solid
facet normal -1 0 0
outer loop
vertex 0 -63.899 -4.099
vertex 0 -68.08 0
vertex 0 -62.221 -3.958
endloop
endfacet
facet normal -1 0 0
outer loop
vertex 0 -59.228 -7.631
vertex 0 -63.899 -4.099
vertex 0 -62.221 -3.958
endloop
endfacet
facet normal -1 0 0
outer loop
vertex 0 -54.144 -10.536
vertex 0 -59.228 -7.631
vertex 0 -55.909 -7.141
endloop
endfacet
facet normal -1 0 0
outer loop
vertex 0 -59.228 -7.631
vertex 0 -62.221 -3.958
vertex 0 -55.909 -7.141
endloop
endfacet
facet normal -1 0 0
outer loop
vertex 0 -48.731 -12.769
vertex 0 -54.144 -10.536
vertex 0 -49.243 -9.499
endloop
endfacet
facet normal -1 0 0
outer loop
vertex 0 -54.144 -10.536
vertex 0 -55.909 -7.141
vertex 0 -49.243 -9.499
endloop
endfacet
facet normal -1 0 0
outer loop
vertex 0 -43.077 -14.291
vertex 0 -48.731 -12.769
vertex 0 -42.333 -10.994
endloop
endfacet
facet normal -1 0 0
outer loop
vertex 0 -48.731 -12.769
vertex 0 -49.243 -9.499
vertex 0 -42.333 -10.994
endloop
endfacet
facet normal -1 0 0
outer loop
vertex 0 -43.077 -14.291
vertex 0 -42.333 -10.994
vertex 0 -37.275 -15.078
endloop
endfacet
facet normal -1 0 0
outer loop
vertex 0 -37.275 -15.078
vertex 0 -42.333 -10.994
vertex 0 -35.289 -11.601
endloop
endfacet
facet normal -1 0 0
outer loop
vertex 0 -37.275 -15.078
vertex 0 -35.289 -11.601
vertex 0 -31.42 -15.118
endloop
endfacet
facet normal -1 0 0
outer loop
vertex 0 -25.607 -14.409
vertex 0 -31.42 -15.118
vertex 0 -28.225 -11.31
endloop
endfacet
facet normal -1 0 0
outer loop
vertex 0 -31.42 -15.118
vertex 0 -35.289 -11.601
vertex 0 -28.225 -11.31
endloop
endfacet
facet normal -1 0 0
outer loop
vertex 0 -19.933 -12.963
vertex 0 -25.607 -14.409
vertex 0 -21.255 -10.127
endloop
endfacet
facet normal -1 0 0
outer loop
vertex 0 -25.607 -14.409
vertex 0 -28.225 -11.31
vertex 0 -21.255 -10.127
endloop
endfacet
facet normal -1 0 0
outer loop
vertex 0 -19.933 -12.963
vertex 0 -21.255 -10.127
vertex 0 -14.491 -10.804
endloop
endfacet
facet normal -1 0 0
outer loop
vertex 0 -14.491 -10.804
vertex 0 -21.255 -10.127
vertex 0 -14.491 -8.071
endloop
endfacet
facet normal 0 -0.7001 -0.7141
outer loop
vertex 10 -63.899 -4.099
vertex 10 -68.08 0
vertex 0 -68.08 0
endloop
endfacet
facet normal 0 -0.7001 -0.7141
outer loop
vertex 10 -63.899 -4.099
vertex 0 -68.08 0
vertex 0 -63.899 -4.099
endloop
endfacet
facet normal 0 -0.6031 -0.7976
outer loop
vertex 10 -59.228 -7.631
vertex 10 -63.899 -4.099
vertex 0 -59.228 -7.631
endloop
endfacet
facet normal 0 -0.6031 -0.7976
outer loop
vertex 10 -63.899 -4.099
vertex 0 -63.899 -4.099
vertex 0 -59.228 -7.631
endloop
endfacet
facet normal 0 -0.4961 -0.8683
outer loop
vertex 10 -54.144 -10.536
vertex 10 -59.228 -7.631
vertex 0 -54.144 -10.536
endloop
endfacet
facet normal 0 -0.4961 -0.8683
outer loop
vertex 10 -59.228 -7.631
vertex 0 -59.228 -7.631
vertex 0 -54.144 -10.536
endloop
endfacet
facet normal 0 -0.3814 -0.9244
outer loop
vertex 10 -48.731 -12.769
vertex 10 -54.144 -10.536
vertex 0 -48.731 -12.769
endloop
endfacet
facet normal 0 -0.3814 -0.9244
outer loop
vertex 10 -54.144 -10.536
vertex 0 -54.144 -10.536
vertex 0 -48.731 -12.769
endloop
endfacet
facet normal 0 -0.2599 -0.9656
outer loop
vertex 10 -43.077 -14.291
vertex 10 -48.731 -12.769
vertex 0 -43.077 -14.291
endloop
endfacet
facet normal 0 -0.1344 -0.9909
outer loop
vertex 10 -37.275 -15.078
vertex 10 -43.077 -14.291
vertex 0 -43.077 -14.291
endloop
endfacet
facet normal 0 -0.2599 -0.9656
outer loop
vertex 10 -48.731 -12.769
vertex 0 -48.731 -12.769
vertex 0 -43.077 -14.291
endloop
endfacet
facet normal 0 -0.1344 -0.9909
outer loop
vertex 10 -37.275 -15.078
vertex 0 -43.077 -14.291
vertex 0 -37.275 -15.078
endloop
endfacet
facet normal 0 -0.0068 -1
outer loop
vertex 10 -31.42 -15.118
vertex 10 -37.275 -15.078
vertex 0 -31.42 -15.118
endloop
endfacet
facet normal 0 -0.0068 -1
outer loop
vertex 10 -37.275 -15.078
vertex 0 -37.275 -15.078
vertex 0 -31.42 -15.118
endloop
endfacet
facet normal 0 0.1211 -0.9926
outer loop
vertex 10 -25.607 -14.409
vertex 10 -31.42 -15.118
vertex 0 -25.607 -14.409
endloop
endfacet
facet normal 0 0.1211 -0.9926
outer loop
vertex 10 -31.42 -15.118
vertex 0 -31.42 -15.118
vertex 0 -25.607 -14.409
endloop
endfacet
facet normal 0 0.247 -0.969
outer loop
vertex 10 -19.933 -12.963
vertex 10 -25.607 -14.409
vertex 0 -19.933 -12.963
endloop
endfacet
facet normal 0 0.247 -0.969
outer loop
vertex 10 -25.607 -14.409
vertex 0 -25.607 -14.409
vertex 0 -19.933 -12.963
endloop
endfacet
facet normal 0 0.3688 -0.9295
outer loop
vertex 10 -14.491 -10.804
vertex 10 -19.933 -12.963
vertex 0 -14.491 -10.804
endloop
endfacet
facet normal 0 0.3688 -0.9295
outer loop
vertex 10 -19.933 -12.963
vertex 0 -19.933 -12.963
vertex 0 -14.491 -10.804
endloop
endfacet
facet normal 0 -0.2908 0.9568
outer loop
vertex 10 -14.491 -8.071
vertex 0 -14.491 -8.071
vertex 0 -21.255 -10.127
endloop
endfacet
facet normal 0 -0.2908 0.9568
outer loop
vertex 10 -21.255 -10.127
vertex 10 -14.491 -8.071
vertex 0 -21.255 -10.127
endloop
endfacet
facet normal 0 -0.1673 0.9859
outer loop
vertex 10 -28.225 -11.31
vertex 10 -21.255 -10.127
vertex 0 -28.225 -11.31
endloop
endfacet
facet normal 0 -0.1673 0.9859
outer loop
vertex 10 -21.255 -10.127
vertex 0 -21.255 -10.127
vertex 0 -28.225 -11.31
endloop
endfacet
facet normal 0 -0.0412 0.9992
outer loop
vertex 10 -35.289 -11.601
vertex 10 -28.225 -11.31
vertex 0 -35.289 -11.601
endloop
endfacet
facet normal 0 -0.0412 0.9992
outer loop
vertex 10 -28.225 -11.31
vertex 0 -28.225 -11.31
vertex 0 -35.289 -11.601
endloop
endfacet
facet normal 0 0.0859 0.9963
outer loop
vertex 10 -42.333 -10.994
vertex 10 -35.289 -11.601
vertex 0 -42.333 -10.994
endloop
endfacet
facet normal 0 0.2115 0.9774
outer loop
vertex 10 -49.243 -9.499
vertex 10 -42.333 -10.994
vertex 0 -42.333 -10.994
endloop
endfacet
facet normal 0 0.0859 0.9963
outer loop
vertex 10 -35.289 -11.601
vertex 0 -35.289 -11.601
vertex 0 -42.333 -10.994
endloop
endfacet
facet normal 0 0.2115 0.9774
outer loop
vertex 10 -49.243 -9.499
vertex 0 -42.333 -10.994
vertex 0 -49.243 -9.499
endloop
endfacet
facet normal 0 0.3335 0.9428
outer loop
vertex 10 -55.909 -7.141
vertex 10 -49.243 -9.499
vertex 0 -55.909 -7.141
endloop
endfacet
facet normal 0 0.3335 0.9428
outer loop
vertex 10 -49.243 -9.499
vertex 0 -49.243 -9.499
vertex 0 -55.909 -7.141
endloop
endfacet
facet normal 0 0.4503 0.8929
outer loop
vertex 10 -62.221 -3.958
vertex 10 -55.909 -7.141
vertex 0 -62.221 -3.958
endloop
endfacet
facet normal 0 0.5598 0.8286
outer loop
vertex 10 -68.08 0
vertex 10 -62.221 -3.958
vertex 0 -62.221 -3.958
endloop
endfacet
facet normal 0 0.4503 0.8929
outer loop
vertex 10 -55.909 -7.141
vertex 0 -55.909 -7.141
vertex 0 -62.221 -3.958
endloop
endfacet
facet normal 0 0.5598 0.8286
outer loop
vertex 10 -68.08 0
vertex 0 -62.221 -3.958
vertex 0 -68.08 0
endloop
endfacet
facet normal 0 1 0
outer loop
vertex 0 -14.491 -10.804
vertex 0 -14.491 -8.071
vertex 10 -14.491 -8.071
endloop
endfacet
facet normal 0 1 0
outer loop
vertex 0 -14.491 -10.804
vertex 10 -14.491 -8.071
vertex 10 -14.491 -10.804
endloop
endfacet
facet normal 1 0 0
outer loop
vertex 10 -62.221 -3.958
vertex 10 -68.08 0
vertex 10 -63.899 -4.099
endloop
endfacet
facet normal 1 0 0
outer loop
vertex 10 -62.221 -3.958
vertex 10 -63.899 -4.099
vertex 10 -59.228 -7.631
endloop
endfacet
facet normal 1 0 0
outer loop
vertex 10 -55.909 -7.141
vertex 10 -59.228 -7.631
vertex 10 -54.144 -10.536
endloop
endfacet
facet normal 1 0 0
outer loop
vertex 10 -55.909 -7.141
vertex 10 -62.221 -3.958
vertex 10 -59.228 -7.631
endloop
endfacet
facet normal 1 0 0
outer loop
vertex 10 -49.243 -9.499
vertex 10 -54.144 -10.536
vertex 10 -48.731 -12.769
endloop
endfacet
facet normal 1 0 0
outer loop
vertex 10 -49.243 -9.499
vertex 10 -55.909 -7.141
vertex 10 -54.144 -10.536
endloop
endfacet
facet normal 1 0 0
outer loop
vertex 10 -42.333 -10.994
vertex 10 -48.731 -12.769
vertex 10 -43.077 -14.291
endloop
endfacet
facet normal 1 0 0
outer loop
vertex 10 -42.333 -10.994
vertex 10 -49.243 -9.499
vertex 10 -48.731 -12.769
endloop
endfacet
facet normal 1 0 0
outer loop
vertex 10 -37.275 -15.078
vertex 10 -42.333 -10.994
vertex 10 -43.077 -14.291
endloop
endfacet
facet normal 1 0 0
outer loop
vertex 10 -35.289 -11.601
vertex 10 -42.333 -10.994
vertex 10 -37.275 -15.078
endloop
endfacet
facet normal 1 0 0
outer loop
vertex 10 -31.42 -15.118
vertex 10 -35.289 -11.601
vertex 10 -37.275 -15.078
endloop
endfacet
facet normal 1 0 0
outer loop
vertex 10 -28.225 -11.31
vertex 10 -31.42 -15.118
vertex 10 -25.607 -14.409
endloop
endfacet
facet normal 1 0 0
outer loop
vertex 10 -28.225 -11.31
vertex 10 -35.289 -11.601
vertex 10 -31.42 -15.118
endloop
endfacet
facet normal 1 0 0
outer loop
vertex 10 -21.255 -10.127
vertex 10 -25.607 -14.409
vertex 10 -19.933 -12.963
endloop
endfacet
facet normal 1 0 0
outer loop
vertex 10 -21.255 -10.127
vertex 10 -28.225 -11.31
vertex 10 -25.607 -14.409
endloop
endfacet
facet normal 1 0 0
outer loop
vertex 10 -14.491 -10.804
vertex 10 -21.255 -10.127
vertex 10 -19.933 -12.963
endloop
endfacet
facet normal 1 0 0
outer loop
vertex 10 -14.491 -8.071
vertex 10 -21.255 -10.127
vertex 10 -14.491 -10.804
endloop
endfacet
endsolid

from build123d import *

# Parameters (mm, degrees)
F1_DEPTH = 10
F3_DEPTH = 35
F5_DEPTH = 45.001


with BuildPart() as f1:
    # F0 (on Right) → F1 (new body)
    with BuildSketch(Plane.YZ):
        with BuildLine():
            ThreePointArc((0, 0), (-34.0398401022, -11.614694955), (-68.0796802044, 0))
            ThreePointArc((-68.0796802044, 0), (-43.0772294723, -14.2909034111), (-14.4906720078, -10.8036128804))
            ThreePointArc((-14.4906720078, -10.8036128804), (-6.7062533875, -6.1248672779), (0, 0))
        make_face()
        with BuildLine():
            ThreePointArc((0, 0), (-6.7062533875, -6.1248672779), (-14.4906720078, -10.8036128804))
            Line((-14.4906720078, -10.8036128804), (0, -10.8036128804))
            Line((0, -10.8036128804), (0, 0))
        make_face()
    extrude(amount=F1_DEPTH)

    # F2 (on face) → F3 (join)
    with BuildSketch(Plane(origin=(0, 0, 0), x_dir=(0, -1, 0), z_dir=(-1, 0, 0))):
        with BuildLine():
            Line((0, -10.8036128804), (14.4906720078, -10.8036128804))
            Line((14.4906720078, -10.8036128804), (14.4906720078, -8.0706065552))
            ThreePointArc((14.4906720078, -8.0706065552), (6.9431775325, -4.5778249918), (0, 0))
            Line((0, 0), (0, -10.8036128804))
        make_face()
    extrude(amount=F3_DEPTH)

    # F4 (on face) → F5 (cut, through all)
    with BuildSketch(Plane.YZ.offset(10)):
        with BuildLine():
            Line((-14.4906720078, -8.0706065552), (-14.4906720078, -10.8036128804))
            Line((-14.4906720078, -10.8036128804), (0, -10.8036128804))
            Line((0, -10.8036128804), (0, 0))
            ThreePointArc((0, 0), (-6.9431775325, -4.5778249918), (-14.4906720078, -8.0706065552))
        make_face()
    extrude(amount=-F5_DEPTH, mode=Mode.SUBTRACT)


solid = f1.part
